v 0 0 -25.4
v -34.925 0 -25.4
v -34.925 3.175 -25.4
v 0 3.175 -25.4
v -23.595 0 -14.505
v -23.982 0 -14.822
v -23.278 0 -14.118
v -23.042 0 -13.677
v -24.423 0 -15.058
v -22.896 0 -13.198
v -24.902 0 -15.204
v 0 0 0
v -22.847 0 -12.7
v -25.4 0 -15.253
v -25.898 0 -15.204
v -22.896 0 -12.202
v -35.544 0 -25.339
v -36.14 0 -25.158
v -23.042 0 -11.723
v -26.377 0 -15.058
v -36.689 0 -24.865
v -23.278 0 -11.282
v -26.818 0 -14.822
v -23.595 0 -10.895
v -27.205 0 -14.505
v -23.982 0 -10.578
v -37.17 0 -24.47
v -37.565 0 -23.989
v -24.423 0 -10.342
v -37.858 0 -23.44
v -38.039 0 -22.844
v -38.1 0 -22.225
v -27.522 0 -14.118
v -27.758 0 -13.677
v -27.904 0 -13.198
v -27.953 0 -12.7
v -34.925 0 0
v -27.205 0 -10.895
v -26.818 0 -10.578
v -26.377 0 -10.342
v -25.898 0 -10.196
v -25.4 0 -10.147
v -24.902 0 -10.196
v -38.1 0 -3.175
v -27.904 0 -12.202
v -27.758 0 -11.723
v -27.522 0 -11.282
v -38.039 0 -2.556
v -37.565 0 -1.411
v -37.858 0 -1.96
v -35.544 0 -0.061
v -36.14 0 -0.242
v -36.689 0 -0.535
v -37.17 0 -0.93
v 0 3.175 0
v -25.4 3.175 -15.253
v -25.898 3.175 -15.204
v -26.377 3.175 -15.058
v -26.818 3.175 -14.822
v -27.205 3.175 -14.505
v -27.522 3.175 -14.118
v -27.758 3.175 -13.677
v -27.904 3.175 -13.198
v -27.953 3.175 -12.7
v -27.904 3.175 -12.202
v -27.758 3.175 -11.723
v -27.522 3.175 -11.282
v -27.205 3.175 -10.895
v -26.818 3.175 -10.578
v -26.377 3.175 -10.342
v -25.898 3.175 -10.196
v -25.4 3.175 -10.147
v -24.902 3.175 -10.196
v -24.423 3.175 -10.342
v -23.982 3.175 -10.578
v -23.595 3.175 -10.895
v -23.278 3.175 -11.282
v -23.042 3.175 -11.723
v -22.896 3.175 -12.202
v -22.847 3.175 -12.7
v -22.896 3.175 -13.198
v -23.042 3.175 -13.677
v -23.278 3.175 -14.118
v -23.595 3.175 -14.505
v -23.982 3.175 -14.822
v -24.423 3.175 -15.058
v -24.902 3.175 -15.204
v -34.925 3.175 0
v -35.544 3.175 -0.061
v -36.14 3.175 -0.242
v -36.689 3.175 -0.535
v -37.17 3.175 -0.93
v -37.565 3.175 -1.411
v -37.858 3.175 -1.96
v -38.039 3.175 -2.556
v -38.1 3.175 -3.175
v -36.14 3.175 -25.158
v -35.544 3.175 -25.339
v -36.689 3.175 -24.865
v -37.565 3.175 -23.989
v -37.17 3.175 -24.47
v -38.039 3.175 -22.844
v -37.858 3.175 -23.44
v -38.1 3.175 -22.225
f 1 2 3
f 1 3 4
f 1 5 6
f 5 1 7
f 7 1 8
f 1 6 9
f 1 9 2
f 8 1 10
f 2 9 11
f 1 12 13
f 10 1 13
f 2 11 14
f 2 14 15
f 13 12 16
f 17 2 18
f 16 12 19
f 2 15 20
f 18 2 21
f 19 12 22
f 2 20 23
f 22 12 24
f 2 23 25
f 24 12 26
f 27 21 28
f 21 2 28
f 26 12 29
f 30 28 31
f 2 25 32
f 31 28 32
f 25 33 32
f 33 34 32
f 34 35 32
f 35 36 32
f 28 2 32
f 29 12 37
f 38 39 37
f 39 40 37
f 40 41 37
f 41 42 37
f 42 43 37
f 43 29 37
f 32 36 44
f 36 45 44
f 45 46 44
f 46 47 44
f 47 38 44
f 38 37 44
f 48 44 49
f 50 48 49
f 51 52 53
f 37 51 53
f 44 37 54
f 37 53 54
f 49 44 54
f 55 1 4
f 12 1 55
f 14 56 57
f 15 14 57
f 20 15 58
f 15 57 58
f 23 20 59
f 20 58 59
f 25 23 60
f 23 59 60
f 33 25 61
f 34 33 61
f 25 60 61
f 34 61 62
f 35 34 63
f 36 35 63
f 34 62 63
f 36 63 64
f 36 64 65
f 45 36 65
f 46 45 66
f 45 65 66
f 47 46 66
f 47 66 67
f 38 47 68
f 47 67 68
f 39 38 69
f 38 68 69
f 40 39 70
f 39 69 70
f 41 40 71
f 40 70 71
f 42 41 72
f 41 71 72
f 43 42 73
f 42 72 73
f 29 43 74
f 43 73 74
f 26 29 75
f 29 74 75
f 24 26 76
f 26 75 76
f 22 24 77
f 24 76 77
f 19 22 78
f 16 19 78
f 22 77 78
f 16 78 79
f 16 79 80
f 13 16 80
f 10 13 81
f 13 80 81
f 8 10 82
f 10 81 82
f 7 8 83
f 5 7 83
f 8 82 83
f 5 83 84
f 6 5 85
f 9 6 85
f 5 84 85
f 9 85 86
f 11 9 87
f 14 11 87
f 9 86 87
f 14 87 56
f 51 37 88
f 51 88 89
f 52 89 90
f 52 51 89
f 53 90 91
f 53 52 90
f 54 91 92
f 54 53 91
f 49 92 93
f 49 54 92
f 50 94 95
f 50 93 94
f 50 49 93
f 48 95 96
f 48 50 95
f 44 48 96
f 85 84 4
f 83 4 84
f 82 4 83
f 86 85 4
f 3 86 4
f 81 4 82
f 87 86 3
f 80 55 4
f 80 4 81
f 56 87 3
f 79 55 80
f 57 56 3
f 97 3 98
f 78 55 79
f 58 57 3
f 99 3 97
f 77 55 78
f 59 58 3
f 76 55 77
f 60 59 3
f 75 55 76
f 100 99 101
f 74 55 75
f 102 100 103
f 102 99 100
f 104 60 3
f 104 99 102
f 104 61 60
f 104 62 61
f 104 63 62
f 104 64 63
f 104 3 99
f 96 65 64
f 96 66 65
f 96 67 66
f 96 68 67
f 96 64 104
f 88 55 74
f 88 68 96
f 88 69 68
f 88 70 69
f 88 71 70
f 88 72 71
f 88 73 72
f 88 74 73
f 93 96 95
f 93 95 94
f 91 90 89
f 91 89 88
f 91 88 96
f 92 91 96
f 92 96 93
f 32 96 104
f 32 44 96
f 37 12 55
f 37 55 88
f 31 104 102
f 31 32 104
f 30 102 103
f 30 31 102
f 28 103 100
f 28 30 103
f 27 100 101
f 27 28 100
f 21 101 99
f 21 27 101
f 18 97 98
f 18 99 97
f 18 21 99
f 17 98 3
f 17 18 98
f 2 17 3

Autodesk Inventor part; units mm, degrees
ref_plane "YZ Plane" through (0, 0, 0) normal (1, 0, 0) x (0, 1, 0)
ref_plane "XZ Plane" through (0, 0, 0) normal (0, 1, 0) x (-1, 0, 0)
ref_plane "XY Plane" through (0, 0, 0) normal (0, 0, 1) x (1, 0, 0)
sketch "Sketch1" plane through (0, 0, 0) normal (0, 1, 0) x (-1, 0, 0)
  line L0 (0, 0) -> (34.925, 0)
  line L1 (38.1, -3.175) -> (38.1, -22.225)
  line L2 (34.925, -25.4) -> (0, -25.4)
  line L3 (0, -25.4) -> (0, 0)
  line L4 (0, 0) -> (0, -12.7)
  line L5 (0, -12.7) -> (25.4, -12.7)
  arc A0 (34.925, -25.4) -> (38.1, -22.225) centre (34.925, -22.225) ccw
  arc A1 (38.1, -3.175) -> (34.925, 0) centre (34.925, -3.175) ccw
  point P0 (38.1, -25.4)
  point P1 (38.1, 0)
  dimension "d0" = 38.1
  dimension "d1" = 25.4
  dimension "d2" = 12.7
  dimension "d3" = 25.4
  dimension "d7" = 3.175
extrude "Extrusion1" add sketch "Sketch1" along normal blind 3.175
hole "Hole1" at (-25.4, 0, -12.7) direction (0, 1, 0) diameter 5.1054 end through all clearance for "Flat Head Machine Screw (82)" size "#10" standard "Ansi Unified Screw Threads"
properties part number "1" material "Steel"
